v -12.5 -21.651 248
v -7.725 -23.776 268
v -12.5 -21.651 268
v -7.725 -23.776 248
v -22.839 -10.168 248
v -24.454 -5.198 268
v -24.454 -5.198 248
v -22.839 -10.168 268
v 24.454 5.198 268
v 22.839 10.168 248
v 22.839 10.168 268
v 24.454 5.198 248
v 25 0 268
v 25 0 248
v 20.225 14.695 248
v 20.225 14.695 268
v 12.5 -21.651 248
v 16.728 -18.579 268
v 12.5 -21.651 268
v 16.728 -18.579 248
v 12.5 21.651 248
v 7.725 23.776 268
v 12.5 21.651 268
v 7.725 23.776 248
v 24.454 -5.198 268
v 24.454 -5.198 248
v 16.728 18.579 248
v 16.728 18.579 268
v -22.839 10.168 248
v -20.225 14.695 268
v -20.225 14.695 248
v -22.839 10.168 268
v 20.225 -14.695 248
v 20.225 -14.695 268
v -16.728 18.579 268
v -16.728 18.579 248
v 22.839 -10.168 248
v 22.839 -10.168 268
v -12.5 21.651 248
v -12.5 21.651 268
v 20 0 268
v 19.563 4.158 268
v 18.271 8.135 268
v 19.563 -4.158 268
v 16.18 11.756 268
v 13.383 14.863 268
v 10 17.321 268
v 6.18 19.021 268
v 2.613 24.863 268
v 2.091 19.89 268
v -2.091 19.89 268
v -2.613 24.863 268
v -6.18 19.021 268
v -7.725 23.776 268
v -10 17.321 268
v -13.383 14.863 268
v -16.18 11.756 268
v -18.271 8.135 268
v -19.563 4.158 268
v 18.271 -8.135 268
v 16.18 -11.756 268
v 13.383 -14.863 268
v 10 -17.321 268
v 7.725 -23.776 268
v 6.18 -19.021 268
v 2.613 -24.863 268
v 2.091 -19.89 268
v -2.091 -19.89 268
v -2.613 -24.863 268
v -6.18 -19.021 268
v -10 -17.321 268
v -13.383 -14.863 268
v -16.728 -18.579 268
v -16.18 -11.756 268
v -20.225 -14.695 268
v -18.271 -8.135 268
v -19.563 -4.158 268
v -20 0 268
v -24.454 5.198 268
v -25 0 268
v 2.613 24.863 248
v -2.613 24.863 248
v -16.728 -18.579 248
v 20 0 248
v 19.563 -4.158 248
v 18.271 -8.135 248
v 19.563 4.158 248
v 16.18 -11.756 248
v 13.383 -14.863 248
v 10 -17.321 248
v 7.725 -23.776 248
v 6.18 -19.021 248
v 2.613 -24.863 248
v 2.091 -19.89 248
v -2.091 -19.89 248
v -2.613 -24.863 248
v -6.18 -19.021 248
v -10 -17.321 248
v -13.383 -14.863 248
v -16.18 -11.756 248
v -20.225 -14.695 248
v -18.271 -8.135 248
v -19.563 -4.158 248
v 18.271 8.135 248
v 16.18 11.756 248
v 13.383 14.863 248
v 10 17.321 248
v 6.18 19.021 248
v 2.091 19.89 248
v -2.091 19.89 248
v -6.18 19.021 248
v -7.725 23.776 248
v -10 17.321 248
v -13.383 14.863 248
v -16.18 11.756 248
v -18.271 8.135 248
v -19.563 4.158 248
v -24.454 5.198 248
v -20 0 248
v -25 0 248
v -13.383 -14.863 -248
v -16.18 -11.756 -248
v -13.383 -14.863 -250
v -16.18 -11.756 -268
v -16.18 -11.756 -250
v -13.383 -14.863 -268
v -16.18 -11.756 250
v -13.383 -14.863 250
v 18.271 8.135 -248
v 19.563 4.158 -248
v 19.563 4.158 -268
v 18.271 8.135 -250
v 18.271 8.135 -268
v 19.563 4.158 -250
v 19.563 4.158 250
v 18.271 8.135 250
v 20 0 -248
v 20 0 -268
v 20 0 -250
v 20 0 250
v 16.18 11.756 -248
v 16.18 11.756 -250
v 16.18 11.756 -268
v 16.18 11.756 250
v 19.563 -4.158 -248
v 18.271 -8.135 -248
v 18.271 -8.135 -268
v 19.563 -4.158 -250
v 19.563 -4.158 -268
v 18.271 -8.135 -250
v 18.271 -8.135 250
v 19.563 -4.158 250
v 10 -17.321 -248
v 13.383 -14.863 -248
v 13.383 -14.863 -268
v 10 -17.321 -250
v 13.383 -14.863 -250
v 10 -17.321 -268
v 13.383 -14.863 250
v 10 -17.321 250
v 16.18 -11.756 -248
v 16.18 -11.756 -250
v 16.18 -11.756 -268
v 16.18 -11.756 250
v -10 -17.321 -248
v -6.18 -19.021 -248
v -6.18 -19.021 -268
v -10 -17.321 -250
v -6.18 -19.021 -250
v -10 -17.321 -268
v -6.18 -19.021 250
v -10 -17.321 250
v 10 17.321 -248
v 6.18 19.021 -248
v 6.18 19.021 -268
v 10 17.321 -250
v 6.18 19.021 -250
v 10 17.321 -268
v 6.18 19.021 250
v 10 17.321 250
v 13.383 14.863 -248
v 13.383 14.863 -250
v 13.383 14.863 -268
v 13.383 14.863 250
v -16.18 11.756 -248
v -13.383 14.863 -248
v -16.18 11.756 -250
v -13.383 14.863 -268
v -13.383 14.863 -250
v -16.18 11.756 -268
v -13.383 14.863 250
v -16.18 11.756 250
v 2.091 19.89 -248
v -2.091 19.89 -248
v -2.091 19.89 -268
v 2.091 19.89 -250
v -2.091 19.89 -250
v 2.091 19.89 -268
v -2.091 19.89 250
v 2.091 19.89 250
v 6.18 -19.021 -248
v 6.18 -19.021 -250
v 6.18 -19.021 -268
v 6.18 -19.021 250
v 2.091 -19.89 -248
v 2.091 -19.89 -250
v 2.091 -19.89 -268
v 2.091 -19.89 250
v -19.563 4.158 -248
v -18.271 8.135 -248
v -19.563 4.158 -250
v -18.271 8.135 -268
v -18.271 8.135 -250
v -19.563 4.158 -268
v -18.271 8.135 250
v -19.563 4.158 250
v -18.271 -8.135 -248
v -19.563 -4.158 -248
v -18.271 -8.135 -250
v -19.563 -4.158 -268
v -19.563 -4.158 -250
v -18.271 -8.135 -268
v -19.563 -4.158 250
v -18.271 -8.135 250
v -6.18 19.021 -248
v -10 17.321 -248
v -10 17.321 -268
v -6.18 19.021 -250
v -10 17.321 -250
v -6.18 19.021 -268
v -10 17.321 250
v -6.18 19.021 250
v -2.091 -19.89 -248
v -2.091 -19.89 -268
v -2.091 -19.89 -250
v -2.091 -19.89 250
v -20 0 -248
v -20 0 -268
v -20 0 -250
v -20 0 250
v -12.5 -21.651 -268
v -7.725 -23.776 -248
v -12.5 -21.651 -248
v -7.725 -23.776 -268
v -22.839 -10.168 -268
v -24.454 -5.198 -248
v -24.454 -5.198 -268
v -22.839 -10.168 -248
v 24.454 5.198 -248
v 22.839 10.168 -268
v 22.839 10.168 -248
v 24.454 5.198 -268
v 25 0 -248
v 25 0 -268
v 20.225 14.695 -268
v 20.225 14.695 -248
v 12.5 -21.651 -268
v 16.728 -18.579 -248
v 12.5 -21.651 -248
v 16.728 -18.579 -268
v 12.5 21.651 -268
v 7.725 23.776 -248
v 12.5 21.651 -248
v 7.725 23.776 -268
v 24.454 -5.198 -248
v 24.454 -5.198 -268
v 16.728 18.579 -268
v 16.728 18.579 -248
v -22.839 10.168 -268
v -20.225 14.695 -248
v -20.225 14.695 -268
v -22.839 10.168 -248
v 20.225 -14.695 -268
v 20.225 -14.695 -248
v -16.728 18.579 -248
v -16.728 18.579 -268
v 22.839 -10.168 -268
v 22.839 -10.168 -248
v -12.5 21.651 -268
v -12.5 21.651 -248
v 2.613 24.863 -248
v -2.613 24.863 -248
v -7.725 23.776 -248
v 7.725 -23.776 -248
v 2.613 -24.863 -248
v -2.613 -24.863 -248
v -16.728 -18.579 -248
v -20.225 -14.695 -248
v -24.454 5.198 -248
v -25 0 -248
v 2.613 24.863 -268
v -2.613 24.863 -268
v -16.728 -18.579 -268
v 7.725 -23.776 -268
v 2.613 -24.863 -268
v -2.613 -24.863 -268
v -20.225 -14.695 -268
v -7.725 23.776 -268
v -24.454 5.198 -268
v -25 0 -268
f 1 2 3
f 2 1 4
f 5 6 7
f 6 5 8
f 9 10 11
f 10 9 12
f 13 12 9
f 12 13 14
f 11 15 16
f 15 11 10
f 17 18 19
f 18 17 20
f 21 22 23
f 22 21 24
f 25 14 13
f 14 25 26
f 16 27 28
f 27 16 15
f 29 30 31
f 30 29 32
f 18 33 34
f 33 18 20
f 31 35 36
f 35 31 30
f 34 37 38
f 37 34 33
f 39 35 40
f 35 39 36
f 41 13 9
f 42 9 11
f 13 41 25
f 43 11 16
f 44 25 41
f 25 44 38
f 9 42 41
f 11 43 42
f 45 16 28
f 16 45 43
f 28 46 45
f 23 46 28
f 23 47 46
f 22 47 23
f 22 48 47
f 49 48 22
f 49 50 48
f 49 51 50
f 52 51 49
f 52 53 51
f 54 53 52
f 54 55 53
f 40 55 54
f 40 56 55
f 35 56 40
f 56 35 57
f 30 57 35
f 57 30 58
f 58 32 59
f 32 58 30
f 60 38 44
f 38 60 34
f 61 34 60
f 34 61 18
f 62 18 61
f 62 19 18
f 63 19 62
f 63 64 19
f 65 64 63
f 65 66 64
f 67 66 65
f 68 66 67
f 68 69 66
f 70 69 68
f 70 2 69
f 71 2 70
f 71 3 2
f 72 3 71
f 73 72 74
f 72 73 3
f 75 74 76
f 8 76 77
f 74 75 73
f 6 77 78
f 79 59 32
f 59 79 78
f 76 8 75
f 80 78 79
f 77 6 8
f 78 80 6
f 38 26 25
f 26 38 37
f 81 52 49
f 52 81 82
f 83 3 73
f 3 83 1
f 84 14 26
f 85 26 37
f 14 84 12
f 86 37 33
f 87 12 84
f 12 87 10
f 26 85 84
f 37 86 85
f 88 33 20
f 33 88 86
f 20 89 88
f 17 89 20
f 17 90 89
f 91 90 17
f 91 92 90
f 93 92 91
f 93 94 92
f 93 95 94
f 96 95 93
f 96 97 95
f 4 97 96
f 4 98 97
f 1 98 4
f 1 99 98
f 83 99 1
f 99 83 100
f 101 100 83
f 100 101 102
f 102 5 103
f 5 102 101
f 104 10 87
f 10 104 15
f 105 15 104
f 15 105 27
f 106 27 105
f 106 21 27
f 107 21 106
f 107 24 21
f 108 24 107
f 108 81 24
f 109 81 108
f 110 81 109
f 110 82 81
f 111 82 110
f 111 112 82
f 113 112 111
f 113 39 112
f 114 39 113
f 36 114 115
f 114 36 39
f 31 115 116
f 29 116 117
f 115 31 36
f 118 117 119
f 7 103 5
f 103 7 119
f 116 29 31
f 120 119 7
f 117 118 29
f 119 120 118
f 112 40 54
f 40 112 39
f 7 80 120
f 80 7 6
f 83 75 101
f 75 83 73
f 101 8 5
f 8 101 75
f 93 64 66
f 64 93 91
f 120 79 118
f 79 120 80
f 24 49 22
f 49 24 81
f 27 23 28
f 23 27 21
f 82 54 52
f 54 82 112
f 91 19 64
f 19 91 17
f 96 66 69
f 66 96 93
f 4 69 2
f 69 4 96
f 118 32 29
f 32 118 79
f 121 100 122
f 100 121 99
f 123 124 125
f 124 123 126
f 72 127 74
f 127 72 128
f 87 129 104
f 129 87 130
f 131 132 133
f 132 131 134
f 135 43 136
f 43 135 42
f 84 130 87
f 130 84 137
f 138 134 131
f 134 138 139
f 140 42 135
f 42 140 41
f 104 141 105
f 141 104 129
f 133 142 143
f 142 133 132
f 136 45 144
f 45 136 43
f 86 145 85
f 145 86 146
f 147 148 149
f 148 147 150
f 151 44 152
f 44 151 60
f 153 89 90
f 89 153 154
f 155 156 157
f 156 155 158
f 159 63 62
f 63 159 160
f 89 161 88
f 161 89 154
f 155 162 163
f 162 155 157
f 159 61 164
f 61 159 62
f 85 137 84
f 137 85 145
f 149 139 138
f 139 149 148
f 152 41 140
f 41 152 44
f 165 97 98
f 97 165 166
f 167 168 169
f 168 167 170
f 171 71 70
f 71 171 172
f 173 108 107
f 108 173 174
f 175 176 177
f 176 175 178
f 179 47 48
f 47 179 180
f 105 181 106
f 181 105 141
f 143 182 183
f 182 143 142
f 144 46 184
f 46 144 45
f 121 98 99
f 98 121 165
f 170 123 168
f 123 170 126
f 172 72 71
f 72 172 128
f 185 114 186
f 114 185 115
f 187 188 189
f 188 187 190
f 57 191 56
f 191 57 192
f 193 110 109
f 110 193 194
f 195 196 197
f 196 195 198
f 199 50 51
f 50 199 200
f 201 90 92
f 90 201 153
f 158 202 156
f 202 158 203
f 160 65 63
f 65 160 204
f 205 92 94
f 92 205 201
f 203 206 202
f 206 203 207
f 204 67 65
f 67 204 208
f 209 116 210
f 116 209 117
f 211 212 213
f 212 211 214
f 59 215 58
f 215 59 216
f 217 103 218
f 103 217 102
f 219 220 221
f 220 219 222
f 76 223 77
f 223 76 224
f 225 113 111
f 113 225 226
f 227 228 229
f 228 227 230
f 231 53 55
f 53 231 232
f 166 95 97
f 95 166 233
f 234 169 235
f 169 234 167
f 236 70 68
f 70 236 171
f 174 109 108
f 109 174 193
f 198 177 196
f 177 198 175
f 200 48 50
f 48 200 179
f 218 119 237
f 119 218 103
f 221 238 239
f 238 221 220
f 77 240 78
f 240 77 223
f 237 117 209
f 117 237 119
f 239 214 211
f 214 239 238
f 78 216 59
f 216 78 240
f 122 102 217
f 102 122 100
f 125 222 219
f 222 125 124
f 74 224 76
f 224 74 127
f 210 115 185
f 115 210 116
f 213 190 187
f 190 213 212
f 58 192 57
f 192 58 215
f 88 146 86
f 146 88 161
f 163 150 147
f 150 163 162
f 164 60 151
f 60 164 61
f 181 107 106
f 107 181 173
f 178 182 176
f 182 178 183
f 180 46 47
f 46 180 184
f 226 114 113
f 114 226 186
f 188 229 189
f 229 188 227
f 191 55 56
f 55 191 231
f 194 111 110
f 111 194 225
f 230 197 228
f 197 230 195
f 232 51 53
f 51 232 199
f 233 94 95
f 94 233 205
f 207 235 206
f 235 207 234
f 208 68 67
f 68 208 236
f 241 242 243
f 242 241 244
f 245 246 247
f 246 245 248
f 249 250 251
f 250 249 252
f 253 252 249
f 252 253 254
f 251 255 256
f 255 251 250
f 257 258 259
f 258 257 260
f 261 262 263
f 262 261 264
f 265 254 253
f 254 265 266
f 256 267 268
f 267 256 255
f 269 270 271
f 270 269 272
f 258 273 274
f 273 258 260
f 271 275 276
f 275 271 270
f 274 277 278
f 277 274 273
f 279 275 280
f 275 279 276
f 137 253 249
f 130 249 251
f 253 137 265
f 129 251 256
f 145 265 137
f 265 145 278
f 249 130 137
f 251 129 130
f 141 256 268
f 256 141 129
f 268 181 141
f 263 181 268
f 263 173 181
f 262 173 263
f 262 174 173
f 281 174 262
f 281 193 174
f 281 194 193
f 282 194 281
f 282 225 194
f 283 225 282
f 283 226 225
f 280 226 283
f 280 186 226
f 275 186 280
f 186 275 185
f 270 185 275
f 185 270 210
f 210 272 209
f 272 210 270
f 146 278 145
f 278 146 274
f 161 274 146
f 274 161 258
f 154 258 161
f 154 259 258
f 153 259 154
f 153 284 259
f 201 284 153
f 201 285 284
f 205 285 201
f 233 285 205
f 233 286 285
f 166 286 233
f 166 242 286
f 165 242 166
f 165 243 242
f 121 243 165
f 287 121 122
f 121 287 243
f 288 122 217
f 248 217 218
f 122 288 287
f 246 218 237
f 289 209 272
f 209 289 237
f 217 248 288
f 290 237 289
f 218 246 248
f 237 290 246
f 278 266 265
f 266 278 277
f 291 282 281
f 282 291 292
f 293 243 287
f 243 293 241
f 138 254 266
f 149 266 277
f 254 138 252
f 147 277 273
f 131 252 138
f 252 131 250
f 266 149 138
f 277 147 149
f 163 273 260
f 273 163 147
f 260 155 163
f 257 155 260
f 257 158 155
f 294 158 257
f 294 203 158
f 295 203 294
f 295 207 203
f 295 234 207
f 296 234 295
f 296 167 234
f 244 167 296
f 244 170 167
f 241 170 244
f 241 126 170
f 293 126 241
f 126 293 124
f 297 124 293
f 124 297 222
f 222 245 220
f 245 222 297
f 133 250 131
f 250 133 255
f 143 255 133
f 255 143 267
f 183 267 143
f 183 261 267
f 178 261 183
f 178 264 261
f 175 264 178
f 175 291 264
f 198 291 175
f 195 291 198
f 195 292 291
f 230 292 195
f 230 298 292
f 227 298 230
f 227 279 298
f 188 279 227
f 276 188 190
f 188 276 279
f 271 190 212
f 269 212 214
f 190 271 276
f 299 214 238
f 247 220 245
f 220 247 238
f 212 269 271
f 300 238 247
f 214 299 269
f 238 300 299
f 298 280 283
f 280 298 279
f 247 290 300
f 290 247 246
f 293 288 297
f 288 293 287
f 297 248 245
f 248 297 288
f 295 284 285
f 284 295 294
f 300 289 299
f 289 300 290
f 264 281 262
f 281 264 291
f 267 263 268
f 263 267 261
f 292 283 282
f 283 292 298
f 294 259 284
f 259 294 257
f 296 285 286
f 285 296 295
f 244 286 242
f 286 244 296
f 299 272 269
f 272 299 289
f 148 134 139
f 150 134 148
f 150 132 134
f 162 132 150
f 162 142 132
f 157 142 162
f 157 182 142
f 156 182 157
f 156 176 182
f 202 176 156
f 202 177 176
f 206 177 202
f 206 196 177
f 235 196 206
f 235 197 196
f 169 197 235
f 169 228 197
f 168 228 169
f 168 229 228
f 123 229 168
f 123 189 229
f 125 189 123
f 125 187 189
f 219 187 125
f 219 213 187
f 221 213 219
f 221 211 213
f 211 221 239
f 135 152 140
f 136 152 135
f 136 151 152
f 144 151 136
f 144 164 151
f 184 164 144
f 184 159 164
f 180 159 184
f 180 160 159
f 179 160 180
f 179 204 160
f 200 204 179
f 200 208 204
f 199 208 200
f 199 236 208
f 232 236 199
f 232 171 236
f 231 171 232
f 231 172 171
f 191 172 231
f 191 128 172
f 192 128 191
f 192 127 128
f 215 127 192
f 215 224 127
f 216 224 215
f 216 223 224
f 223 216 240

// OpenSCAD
// Connectivity-fixed HT pipe model (all parts unioned + slight overlaps)

module ht_pipe_body(diameter, length) {
    cylinder(d=diameter, h=length, center=true);
}

module pipe_end_fitting_geometry(diameter, h=20) {
    // Ring/cap-like sleeve (hollow)
    difference() {
        cylinder(d=diameter + 10, h=h, center=true);
        translate([0, 0, -1])
            cylinder(d=diameter, h=h + 2, center=true);
    }
}

module ht_pipe(type, length) {
    if (type == "HT 40") {
        diameter = 40;

        fitting_h = 20;
        overlap   = 2;   // 1–2mm overlap to guarantee connection

        union() {
            // Main pipe centered at origin
            ht_pipe_body(diameter, length);

            // Attach fittings to both ends with overlap into the pipe
            // Pipe spans z = [-length/2, +length/2]
            // Each fitting spans z = [center - fitting_h/2, center + fitting_h/2]
            // Place so inner face penetrates pipe by 'overlap'
            translate([0, 0,  (length/2) + (fitting_h/2) - overlap])
                pipe_end_fitting_geometry(diameter, fitting_h);

            translate([0, 0, -(length/2) - (fitting_h/2) + overlap])
                pipe_end_fitting_geometry(diameter, fitting_h);
        }
    }
}

ht_pipe("HT 40", 500);
